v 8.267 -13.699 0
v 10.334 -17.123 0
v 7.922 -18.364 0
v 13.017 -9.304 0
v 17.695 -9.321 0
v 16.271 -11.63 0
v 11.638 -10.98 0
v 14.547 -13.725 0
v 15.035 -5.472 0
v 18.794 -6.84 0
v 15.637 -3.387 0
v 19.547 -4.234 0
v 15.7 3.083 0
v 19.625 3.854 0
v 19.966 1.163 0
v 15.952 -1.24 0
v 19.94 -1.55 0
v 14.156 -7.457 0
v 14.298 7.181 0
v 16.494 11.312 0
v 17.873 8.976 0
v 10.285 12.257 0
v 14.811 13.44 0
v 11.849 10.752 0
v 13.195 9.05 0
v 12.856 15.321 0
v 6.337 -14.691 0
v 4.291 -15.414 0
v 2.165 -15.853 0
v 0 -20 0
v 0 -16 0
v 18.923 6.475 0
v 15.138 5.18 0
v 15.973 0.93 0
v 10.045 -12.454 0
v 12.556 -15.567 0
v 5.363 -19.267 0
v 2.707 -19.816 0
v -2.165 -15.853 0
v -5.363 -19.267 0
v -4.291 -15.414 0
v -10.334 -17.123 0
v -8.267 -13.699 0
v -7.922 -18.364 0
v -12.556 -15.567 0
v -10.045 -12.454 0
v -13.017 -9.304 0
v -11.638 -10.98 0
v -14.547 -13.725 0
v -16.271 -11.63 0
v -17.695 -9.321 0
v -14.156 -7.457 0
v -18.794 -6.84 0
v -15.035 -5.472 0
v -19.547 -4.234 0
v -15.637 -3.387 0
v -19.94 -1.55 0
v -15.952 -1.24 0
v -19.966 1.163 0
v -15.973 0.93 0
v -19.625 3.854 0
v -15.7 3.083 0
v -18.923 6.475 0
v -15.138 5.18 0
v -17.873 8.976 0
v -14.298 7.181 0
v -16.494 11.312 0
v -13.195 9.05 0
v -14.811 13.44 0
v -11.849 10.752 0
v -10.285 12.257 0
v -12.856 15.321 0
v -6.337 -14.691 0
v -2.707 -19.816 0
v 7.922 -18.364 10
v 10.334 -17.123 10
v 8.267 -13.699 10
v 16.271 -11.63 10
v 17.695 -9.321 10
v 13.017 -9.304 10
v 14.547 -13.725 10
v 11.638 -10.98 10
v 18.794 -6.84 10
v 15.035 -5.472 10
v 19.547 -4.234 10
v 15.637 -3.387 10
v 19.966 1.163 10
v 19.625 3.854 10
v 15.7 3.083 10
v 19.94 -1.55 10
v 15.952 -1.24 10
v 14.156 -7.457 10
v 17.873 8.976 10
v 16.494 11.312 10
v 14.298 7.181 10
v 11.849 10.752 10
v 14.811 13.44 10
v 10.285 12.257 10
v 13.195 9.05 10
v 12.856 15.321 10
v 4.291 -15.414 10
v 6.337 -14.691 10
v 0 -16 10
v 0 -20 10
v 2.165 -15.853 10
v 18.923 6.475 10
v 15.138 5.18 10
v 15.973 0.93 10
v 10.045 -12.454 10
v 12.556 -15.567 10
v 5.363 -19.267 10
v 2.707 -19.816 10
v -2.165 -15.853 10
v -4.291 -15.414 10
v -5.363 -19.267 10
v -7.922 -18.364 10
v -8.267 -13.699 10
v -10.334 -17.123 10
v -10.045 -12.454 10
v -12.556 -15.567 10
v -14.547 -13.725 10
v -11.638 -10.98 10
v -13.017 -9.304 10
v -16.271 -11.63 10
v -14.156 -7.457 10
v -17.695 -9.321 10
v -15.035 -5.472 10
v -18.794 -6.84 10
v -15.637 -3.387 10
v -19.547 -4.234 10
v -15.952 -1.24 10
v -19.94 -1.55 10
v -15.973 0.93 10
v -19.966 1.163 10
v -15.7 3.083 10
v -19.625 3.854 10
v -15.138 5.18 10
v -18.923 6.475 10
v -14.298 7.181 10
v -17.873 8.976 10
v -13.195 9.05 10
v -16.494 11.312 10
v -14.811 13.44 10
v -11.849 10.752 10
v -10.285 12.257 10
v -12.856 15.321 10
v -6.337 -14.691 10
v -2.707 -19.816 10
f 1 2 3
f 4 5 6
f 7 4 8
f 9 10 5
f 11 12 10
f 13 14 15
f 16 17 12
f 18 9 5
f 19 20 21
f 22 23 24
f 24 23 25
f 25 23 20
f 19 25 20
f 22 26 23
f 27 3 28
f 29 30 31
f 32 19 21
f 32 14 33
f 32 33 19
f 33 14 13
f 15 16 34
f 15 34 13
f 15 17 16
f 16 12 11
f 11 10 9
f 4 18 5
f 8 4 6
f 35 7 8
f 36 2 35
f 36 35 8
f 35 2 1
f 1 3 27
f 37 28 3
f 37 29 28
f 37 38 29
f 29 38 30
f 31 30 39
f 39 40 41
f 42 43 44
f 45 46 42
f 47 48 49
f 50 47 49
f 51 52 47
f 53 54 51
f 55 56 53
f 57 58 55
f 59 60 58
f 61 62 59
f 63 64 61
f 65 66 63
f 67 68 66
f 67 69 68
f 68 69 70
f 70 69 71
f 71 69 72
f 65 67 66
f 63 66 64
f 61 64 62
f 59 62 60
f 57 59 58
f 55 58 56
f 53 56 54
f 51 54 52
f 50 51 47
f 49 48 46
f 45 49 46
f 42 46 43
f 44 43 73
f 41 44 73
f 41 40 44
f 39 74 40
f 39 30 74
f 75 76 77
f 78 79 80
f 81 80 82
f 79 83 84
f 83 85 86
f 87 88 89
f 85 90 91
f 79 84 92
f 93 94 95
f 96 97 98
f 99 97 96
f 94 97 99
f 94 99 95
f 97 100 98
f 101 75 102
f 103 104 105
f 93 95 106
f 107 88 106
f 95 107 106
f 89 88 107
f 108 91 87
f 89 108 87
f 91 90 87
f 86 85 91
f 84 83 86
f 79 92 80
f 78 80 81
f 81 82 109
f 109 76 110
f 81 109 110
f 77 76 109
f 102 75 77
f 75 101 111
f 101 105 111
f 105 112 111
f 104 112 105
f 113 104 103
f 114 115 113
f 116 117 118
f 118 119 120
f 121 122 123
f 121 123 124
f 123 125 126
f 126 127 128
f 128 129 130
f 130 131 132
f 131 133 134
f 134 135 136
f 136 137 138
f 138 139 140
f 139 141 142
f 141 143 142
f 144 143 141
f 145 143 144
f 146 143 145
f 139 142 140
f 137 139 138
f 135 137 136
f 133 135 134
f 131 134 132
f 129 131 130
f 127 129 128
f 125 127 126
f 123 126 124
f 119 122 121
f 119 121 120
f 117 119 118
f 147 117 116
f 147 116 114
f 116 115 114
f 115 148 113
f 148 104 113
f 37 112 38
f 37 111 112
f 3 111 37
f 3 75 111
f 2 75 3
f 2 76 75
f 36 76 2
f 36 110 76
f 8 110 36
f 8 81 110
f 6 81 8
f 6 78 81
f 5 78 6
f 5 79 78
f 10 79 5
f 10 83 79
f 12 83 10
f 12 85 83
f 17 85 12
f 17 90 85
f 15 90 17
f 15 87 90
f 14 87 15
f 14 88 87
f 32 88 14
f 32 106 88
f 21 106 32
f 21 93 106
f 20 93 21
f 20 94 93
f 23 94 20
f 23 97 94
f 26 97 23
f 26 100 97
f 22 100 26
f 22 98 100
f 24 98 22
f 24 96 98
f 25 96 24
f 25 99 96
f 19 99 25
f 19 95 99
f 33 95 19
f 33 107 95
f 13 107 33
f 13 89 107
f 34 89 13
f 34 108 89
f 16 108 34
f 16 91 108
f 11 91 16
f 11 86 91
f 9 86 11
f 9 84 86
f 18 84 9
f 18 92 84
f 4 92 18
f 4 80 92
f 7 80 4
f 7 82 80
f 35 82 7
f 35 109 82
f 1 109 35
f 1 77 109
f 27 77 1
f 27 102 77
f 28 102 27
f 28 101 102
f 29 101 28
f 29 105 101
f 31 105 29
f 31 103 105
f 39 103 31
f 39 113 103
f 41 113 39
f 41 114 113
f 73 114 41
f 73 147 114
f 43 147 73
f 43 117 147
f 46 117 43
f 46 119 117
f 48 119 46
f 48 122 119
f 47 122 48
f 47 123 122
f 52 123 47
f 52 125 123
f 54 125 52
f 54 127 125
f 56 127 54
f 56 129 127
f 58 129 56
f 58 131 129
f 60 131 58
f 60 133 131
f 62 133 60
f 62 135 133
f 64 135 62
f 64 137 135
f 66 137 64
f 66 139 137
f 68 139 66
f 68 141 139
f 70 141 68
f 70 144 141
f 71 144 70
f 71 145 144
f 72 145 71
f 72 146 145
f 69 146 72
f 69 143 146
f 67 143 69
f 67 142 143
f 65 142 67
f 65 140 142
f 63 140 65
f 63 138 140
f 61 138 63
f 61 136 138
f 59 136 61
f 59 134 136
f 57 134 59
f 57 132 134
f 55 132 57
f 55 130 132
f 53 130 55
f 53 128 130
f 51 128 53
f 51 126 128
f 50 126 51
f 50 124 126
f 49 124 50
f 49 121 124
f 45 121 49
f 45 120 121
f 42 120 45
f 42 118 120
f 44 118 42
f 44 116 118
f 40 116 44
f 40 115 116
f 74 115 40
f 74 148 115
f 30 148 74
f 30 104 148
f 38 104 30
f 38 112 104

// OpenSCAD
$fn = 32;

// ----------------------------------------------------------------------
// Spring clip: 40 mm outside, 4 mm band, 80 degree opening
// ----------------------------------------------------------------------

// --- parameters (mm) ---
outer_r = 20;             // clip outside radius
inner_r = 16;             // clip bore radius
band = 4;                 // band thickness
clip_w = 10;              // clip width
opening = 80;             // opening angle

clip_profile = [[-12.856, 15.321], [-14.811, 13.44], [-16.494, 11.312], [-17.873, 8.976], [-18.923, 6.475], [-19.625, 3.854], [-19.966, 1.163], [-19.94, -1.55], [-19.547, -4.234], [-18.794, -6.84], [-17.695, -9.321], [-16.271, -11.63], [-14.547, -13.725], [-12.556, -15.567], [-10.334, -17.123], [-7.922, -18.364], [-5.363, -19.267], [-2.707, -19.816], [0, -20], [2.707, -19.816], [5.363, -19.267], [7.922, -18.364], [10.334, -17.123], [12.556, -15.567], [14.547, -13.725], [16.271, -11.63], [17.695, -9.321], [18.794, -6.84], [19.547, -4.234], [19.94, -1.55], [19.966, 1.163], [19.625, 3.854], [18.923, 6.475], [17.873, 8.976], [16.494, 11.312], [14.811, 13.44], [12.856, 15.321], [10.285, 12.257], [11.849, 10.752], [13.195, 9.05], [14.298, 7.181], [15.138, 5.18], [15.7, 3.083], [15.973, 0.93], [15.952, -1.24], [15.637, -3.387], [15.035, -5.472], [14.156, -7.457], [13.017, -9.304], [11.638, -10.98], [10.045, -12.454], [8.267, -13.699], [6.337, -14.691], [4.291, -15.414], [2.165, -15.853], [0, -16], [-2.165, -15.853], [-4.291, -15.414], [-6.337, -14.691], [-8.267, -13.699], [-10.045, -12.454], [-11.638, -10.98], [-13.017, -9.304], [-14.156, -7.457], [-15.035, -5.472], [-15.637, -3.387], [-15.952, -1.24], [-15.973, 0.93], [-15.7, 3.083], [-15.138, 5.18], [-14.298, 7.181], [-13.195, 9.05], [-11.849, 10.752], [-10.285, 12.257]];

difference() {
  union() {
    linear_extrude(height = clip_w) polygon(clip_profile);
  }
}
